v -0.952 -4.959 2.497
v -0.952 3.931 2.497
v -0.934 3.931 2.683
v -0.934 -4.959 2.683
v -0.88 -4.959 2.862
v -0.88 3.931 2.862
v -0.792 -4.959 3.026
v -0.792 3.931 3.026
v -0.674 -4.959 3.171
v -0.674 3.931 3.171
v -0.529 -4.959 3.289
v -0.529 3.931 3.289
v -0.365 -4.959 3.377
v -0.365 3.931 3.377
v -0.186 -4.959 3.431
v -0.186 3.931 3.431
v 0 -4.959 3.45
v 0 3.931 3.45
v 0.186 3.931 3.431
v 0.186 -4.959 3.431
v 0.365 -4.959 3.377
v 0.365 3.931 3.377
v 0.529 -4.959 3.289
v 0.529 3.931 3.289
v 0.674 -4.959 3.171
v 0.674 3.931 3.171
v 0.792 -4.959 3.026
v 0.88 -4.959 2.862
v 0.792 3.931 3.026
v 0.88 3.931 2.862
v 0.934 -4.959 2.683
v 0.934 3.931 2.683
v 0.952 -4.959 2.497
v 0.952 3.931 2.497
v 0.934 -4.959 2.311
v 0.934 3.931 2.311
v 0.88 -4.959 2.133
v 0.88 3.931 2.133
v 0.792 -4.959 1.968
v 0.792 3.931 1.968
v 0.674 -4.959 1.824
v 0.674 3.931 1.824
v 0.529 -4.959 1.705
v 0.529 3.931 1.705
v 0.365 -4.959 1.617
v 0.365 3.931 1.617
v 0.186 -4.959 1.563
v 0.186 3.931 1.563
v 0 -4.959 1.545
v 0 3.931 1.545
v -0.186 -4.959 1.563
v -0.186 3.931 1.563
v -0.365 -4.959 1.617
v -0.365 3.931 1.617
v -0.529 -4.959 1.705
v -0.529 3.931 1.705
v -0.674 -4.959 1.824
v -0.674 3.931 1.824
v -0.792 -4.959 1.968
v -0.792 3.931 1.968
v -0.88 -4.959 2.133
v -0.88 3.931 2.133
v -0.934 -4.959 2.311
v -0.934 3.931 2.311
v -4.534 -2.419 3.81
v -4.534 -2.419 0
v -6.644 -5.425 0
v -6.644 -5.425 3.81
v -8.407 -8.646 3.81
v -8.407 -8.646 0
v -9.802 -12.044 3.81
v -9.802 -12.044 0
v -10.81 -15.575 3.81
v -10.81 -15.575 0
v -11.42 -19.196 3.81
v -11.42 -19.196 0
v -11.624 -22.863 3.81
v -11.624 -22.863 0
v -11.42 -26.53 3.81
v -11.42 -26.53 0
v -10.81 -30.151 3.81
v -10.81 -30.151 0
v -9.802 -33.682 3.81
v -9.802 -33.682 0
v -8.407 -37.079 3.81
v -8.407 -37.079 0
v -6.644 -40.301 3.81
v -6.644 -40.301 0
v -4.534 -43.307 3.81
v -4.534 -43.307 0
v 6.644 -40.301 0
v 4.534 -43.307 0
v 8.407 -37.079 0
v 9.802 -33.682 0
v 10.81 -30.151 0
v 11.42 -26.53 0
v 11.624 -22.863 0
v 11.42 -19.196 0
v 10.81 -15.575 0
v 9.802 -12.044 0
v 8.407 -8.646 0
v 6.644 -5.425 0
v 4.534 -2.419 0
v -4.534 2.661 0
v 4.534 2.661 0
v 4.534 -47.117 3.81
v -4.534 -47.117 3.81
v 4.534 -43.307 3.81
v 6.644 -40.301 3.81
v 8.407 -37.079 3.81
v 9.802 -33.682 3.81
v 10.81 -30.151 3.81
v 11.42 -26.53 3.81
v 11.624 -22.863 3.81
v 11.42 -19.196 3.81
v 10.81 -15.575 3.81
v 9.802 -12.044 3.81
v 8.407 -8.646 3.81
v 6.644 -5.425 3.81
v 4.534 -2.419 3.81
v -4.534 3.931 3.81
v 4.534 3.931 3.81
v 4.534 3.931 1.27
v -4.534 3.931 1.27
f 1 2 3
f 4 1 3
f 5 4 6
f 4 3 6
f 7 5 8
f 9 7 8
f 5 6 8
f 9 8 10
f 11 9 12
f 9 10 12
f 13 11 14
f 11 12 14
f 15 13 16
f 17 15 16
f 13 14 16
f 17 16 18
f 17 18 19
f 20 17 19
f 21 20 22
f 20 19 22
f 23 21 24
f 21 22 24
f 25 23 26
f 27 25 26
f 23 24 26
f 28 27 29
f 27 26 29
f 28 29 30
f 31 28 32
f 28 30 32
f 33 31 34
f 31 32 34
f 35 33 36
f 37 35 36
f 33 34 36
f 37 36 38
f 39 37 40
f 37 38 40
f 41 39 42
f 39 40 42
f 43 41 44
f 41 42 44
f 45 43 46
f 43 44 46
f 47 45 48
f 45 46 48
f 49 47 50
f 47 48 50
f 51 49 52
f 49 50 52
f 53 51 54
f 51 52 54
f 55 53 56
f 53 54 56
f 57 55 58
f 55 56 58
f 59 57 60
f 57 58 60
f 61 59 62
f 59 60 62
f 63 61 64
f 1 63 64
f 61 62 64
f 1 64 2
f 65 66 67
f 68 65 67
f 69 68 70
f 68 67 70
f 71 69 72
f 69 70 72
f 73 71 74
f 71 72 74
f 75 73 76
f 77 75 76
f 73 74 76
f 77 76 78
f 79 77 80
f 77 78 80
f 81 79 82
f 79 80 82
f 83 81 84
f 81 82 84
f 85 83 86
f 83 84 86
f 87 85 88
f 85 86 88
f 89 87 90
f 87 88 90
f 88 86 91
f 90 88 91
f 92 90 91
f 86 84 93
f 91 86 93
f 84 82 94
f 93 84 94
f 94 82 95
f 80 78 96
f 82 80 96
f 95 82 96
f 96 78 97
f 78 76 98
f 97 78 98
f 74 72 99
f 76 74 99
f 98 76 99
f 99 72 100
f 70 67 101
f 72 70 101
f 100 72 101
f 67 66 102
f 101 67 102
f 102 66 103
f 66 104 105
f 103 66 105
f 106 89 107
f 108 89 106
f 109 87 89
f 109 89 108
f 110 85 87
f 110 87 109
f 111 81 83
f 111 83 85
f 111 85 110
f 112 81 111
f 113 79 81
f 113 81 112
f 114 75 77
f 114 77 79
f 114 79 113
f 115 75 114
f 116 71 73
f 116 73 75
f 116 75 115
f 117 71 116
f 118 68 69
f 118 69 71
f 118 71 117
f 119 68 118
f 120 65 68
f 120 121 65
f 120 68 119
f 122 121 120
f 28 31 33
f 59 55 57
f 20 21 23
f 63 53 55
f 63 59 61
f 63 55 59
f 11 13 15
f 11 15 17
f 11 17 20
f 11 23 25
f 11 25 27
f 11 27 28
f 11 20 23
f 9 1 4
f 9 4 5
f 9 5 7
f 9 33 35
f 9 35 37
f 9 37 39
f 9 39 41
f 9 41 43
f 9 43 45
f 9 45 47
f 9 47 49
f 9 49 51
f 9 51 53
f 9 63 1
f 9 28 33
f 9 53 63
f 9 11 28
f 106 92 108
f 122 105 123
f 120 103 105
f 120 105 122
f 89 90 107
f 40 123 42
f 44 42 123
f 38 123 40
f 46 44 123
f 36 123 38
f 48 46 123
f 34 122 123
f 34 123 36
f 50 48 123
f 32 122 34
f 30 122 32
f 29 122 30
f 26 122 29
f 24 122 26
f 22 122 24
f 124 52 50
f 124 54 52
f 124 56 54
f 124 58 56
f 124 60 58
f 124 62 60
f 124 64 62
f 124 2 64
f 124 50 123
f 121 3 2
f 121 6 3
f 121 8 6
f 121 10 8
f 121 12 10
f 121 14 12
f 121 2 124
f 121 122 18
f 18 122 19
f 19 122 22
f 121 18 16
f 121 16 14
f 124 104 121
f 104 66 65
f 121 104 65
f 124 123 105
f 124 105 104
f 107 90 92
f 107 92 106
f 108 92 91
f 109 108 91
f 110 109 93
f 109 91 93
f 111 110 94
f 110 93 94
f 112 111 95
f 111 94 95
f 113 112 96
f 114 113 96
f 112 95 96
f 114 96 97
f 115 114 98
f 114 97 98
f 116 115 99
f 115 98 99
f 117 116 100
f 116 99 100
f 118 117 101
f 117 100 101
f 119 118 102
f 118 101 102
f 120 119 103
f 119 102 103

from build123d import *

# Parameters (mm, degrees)
F1_DEPTH    = 3.81
F2_W        = 9.0688861602
F2_H        = 3.81
F3_DEPTH    = 6.35
F4_SIZE     = 1.27
F5_W        = 9.0688861602
F5_H        = 3.81
F6_DEPTH    = 5.08
F7_T1_DEPTH = 35.1971853179
F8_R        = 0.9525
F9_DEPTH    = 8.89


# Not quite as in the source:
# - a fillet or chamfer that OpenCascade refuses, or shapes differently, is made with other operations: its cross-section is extruded or revolved along the edge and cut away or added


with BuildPart() as f1:
    # F0 (on Top) → F1 (new body)
    with BuildSketch(Plane.XY):
        with BuildLine():
            Line((4.5344430801, -2.4189800566), (-4.5344430801, -2.4189800566))
            ThreePointArc((-4.5344430801, -2.4189800566), (-11.6244136954, -22.8629027748), (-4.5344430801, -43.306825493))
            Line((-4.5344430801, -43.306825493), (4.5344430801, -43.306825493))
            ThreePointArc((4.5344430801, -43.306825493), (11.6244136954, -22.8629027748), (4.5344430801, -2.4189800566))
        make_face()
    extrude(amount=F1_DEPTH)

    # F2 (on face) → F3 (join)
    with BuildSketch(Plane(origin=(0, -2.4189800566, 0), x_dir=(-1, 0, 0), z_dir=(0, 1, 0))):
        with Locations((0, 1.905)):
            Rectangle(F2_W, F2_H)
    extrude(amount=F3_DEPTH)

    # F4
    f4_edges = [f1.edges().sort_by_distance(p)[0] for p in [
        (0, 3.93102, 0),
    ]]
    chamfer(f4_edges, length=F4_SIZE)

    # F5 (on face) → F6 (join)
    with BuildSketch(Plane.XZ.offset(43.306825493)):
        with Locations((0, 1.905)):
            Rectangle(F5_W, F5_H)
    extrude(amount=F6_DEPTH)

    # F7: chamfer of 5.08 on 1 edges, made by hand

    # F7_s2 → F7_t1 (cut)
    with BuildSketch(Plane.YZ.offset(-17.598592659)):
        Polygon((-43.306825493, 0), (-48.386825493, 5.08), (-48.386825493, 0), align=None)
    extrude(amount=F7_T1_DEPTH, mode=Mode.SUBTRACT)

    # F8 (on face) → F9 (cut)
    with BuildSketch(Plane(origin=(0, 3.9310199434, 0), x_dir=(-1, 0, 0), z_dir=(0, 1, 0))):
        with Locations((0, 2.4971892126)):
            Circle(F8_R)
    extrude(amount=-F9_DEPTH, mode=Mode.SUBTRACT)


solid = f1.part
